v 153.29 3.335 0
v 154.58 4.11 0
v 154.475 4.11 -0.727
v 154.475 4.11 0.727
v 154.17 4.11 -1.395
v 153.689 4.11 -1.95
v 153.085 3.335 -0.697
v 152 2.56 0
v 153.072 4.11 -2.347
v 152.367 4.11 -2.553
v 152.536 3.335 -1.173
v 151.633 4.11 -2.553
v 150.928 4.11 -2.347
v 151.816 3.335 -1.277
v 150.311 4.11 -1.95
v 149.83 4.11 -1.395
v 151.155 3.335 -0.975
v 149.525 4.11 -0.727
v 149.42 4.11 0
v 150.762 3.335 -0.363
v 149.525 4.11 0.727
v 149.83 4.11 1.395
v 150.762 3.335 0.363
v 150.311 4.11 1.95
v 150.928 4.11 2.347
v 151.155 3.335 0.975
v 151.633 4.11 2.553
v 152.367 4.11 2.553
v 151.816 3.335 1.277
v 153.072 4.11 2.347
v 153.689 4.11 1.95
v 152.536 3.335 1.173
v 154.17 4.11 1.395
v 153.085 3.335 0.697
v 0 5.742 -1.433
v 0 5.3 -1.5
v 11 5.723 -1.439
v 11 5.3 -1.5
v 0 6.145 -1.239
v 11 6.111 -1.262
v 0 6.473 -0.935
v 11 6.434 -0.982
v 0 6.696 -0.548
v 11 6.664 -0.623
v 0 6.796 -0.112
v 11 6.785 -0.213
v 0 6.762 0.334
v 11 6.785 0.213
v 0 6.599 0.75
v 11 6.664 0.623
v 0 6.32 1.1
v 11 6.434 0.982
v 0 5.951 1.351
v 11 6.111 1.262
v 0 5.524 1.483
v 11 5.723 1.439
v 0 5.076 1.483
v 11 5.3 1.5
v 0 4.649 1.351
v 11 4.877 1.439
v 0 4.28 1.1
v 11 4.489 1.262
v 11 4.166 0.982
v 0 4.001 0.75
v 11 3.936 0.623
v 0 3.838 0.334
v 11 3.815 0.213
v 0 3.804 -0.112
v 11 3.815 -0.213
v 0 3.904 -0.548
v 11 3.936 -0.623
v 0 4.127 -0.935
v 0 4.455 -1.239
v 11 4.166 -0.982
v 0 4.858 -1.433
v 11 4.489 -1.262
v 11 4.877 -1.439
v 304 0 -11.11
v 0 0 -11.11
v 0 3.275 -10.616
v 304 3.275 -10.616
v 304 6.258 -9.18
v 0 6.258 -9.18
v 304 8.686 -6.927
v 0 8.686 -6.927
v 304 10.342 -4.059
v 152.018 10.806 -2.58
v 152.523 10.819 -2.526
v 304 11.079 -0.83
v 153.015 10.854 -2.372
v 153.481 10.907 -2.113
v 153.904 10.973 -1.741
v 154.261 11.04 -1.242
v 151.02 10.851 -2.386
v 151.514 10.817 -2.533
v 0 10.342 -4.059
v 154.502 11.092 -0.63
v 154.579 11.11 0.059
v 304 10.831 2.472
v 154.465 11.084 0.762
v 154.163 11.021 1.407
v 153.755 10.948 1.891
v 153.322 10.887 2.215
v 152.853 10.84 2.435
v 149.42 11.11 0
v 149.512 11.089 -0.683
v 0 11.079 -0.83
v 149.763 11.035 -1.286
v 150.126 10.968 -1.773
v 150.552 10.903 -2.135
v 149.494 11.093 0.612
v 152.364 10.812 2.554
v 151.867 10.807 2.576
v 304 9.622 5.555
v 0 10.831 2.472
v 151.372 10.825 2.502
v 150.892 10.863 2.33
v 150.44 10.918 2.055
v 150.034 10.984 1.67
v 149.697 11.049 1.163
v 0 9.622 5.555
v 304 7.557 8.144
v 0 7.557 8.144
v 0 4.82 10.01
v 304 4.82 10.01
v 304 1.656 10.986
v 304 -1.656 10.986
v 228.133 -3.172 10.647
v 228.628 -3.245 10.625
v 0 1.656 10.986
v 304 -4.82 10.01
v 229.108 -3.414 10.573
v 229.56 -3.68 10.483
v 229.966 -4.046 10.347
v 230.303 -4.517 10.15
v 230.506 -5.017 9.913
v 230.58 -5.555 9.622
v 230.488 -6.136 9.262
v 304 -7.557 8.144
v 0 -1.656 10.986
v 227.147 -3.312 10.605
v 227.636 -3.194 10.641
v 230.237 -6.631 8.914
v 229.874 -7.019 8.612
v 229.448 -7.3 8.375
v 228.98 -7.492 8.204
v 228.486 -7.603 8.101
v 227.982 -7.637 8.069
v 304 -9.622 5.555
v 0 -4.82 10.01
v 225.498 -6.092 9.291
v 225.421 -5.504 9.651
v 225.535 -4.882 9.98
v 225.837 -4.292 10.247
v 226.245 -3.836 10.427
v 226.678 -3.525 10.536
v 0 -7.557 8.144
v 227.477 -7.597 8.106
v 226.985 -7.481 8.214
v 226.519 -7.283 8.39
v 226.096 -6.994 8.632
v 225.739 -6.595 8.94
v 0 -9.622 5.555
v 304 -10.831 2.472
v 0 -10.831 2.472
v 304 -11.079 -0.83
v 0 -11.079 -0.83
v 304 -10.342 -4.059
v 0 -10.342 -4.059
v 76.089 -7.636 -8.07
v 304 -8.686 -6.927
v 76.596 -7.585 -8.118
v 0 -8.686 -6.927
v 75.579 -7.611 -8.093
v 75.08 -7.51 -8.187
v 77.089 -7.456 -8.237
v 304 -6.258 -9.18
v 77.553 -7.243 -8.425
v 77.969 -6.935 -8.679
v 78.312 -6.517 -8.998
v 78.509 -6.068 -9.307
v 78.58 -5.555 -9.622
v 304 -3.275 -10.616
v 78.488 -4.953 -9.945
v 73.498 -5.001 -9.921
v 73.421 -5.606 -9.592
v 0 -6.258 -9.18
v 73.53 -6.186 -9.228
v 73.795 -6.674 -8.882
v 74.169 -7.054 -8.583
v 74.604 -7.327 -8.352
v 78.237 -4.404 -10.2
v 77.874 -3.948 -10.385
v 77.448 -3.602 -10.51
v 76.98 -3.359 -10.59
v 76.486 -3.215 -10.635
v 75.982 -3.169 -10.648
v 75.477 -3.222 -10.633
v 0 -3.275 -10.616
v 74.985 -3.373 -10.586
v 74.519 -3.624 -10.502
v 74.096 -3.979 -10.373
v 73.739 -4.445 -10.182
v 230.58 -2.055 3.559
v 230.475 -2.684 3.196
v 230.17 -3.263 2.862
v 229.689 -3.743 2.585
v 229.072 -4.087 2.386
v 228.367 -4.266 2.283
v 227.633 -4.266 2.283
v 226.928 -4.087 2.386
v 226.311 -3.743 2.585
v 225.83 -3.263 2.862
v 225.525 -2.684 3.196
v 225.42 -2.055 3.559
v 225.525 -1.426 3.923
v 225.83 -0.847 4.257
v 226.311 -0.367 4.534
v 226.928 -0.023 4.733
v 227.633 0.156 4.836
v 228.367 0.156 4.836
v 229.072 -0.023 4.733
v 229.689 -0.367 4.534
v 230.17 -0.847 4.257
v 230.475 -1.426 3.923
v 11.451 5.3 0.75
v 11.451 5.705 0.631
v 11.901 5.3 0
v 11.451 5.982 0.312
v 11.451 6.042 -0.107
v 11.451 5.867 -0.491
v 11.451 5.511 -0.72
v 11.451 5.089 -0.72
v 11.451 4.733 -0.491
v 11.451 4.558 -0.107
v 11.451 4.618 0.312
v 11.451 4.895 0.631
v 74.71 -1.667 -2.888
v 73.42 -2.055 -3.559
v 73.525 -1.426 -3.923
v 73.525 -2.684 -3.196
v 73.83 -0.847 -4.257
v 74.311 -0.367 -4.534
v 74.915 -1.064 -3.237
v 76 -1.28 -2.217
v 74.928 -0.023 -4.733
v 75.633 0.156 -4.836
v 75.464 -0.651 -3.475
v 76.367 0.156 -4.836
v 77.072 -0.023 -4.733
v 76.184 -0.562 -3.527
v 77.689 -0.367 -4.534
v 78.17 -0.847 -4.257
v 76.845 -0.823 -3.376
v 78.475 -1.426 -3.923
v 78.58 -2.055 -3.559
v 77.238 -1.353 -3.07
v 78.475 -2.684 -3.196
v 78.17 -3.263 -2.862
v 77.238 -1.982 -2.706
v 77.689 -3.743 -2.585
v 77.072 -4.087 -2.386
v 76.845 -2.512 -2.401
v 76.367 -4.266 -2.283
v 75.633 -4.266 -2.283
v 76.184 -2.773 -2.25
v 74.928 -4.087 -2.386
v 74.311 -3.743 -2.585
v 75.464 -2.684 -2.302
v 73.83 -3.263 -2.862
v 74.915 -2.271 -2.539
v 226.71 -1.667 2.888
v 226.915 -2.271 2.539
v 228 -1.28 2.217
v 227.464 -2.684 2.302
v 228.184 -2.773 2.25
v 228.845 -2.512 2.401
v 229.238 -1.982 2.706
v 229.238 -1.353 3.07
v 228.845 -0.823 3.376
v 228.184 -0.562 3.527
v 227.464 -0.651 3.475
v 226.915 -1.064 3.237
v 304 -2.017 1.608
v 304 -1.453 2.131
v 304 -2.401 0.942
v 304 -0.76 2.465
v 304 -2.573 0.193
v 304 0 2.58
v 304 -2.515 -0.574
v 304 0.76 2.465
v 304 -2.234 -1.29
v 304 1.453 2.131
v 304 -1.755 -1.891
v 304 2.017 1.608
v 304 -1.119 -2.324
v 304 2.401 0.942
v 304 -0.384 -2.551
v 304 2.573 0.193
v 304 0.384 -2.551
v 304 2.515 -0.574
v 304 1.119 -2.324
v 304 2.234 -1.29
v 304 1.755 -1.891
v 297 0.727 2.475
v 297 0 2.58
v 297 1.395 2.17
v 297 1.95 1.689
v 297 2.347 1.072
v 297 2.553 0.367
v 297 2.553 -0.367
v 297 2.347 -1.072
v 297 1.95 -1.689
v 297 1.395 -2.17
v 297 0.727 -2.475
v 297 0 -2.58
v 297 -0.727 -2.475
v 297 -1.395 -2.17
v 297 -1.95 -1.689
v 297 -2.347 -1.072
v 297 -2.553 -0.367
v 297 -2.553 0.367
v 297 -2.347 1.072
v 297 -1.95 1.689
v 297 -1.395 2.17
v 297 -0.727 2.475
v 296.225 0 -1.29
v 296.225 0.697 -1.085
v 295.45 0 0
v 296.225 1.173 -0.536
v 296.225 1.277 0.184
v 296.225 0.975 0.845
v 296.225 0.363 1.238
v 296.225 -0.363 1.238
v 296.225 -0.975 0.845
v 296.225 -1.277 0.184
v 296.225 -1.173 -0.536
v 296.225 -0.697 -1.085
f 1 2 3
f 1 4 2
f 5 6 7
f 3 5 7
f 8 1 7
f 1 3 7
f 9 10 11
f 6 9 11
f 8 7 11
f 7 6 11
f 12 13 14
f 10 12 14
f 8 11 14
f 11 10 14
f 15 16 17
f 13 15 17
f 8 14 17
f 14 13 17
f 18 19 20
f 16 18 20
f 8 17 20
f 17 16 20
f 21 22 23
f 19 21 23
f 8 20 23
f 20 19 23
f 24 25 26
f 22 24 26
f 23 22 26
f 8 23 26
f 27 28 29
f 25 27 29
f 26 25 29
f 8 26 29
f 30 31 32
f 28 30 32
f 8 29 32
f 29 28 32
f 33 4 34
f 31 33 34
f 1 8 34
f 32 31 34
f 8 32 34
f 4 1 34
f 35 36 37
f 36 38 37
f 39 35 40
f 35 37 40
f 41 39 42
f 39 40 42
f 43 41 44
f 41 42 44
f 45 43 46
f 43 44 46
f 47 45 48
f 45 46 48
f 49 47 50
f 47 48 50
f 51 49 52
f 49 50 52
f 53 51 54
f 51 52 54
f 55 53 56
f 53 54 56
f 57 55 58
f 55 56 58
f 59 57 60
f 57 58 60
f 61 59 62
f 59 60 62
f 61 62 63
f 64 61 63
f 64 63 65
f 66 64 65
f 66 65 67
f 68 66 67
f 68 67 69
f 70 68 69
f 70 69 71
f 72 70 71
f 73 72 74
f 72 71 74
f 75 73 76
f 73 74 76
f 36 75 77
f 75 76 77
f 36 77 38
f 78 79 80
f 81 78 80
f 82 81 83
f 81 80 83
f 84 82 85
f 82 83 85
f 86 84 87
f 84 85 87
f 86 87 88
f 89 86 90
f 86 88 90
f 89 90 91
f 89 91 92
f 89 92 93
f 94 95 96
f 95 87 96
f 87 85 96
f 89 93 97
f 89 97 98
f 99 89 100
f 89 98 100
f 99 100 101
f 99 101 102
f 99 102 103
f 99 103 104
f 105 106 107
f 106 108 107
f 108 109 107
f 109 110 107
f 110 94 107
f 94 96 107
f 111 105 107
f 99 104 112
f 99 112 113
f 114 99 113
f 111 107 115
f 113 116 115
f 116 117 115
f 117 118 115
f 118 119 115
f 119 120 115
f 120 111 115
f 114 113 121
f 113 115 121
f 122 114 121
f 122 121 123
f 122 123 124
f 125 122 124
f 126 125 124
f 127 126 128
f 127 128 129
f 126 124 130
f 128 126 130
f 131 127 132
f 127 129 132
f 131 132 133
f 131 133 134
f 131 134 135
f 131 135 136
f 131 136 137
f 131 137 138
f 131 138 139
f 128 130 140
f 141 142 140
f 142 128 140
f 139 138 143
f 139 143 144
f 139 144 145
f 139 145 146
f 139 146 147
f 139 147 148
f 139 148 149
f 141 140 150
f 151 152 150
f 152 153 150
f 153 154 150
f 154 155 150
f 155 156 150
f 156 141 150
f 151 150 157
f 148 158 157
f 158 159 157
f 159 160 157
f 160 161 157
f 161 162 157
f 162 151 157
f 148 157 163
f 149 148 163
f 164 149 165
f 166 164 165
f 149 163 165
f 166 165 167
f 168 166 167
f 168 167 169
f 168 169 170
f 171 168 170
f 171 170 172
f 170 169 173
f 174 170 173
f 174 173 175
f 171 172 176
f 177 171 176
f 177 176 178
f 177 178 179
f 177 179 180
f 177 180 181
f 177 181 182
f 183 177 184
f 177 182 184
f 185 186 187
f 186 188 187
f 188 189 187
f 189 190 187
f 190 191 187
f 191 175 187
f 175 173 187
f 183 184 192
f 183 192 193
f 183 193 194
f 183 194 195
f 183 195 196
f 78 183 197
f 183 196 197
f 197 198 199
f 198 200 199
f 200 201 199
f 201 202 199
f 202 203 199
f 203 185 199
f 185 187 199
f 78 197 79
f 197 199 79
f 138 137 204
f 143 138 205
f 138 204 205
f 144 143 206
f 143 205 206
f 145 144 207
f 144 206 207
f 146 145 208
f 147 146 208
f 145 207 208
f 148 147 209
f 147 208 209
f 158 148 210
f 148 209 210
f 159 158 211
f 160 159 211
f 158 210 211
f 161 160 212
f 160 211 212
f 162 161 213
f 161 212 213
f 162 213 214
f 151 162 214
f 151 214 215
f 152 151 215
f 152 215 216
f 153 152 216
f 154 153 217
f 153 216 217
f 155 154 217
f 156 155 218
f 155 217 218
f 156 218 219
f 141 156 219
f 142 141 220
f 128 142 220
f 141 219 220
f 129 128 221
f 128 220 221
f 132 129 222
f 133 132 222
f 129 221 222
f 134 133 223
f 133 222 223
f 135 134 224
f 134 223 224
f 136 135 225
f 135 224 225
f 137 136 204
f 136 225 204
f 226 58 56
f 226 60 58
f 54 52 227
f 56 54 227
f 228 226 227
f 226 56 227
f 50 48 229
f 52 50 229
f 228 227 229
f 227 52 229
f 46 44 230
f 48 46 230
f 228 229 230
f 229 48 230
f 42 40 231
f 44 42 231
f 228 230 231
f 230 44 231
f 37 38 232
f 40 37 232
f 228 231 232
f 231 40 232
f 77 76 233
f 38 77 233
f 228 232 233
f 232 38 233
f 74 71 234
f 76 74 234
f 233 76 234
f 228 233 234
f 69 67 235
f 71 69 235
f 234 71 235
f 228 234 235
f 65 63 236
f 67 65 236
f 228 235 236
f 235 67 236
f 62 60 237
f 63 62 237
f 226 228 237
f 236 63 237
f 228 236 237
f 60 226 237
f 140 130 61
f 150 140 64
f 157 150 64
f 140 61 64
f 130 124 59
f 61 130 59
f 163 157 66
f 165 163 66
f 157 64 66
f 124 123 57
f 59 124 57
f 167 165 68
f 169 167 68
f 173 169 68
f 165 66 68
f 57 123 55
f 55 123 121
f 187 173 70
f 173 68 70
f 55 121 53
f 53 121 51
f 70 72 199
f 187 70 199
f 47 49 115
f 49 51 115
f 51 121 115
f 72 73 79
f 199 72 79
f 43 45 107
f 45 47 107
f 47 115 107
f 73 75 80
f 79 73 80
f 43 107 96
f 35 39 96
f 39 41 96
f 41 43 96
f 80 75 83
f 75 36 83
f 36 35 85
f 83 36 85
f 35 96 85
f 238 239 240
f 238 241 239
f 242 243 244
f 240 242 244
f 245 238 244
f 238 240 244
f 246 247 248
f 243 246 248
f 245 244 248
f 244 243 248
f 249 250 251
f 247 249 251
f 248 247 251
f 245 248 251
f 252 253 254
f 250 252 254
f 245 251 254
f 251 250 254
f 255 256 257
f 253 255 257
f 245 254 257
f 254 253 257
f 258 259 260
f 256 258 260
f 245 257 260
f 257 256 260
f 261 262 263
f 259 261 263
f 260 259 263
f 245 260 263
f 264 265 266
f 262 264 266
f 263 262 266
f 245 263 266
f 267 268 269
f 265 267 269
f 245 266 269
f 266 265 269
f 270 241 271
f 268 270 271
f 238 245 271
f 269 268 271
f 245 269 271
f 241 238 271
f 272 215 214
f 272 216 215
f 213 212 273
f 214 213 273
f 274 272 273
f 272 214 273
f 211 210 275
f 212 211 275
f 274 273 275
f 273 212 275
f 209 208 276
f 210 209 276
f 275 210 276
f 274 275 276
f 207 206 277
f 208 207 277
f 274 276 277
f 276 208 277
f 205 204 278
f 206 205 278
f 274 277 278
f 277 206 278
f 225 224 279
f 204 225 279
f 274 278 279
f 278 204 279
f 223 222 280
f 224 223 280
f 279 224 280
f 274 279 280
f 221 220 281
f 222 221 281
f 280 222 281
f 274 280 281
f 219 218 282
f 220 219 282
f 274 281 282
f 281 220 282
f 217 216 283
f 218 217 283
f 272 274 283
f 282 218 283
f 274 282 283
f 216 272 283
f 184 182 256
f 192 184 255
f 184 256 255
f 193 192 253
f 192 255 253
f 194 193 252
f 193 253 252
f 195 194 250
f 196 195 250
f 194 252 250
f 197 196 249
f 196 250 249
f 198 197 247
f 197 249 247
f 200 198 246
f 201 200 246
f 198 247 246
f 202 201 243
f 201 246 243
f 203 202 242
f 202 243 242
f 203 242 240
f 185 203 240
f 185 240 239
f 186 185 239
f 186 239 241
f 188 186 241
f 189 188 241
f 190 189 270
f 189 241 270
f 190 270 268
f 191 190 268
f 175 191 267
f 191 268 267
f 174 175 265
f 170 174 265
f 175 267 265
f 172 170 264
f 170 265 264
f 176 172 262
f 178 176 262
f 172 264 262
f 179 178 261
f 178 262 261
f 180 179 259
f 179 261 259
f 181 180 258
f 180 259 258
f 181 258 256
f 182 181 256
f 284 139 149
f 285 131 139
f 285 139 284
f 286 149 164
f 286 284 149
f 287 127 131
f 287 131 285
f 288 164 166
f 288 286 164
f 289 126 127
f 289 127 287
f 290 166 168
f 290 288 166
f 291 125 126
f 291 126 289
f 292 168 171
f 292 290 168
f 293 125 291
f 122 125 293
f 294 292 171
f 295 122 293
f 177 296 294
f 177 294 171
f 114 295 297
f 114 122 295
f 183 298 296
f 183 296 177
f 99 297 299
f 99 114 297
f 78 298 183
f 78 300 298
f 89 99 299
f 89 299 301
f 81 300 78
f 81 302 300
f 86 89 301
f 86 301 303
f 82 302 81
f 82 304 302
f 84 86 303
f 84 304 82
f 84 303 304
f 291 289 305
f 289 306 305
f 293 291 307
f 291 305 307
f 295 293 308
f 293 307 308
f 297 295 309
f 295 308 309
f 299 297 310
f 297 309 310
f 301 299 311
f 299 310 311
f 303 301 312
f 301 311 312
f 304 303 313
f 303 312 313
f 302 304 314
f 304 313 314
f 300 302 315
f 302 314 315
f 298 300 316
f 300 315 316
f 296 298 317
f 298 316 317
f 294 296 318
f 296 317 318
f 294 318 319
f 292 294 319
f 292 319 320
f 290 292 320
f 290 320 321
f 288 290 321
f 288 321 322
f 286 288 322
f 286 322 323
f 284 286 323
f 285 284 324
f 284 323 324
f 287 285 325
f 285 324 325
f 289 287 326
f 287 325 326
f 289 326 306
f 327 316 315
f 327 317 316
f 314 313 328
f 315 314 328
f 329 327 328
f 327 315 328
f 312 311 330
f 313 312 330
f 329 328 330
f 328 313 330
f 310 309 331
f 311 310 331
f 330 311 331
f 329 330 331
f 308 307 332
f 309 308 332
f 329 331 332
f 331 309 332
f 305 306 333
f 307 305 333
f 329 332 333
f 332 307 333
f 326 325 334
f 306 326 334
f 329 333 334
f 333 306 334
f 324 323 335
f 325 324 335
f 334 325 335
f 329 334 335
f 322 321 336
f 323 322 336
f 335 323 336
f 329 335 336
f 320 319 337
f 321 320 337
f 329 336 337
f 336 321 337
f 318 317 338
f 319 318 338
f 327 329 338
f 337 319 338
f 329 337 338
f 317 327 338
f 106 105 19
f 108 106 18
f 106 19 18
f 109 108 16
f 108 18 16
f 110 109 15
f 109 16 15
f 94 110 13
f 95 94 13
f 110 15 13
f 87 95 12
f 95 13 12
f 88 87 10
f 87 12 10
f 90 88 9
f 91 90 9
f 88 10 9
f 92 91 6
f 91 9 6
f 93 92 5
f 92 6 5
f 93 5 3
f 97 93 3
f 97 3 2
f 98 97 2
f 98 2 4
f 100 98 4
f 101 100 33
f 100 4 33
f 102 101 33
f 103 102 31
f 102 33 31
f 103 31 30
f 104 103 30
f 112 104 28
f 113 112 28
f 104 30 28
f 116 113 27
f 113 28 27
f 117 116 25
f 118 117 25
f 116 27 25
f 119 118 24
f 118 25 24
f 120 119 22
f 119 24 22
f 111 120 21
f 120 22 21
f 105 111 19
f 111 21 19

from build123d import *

# Parameters (mm, degrees)
SKETCH1_R                            = 11.11
BOSS_EXTRUDE1_DEPTH                  = 304
F_3_0_3_DIAMETER_HOLE2_D             = 3
F_3_0_3_DIAMETER_HOLE2_DEPTH         = 11
F_3_0_3_DIAMETER_HOLE2_TIP           = 0.901290929
F_13_64_0_20313_DIAMETER_HOLE2_D     = 5.159502
F_13_64_0_20313_DIAMETER_HOLE2_DEPTH = 7
F_13_64_0_20313_DIAMETER_HOLE2_TIP   = 1.550070783
F_13_64_0_20313_DIAMETER_HOLE4_D     = 5.159502
F_13_64_0_20313_DIAMETER_HOLE4_DEPTH = 7
F_13_64_0_20313_DIAMETER_HOLE4_TIP   = 1.550070783
F_13_64_0_20313_DIAMETER_HOLE5_D     = 5.159502
F_13_64_0_20313_DIAMETER_HOLE5_DEPTH = 7
F_13_64_0_20313_DIAMETER_HOLE5_TIP   = 1.550070783
F_13_64_0_20313_DIAMETER_HOLE6_D     = 5.159502
F_13_64_0_20313_DIAMETER_HOLE6_DEPTH = 7
F_13_64_0_20313_DIAMETER_HOLE6_TIP   = 1.550070783


with BuildPart() as part:
    # Sketch1 → Boss-Extrude1 (new body)
    with BuildSketch(Plane(origin=(0, 0, 0), x_dir=(0, 0, -1), z_dir=(1, 0, 0))):
        Circle(SKETCH1_R)
    extrude(amount=BOSS_EXTRUDE1_DEPTH)

    # Ø3.0 (3) Diameter Hole2
    with Locations(Plane.ZY):
        with Locations((0, 5.3)):
            Hole(F_3_0_3_DIAMETER_HOLE2_D / 2, depth=F_3_0_3_DIAMETER_HOLE2_DEPTH)
            with Locations((0, 0, -(F_3_0_3_DIAMETER_HOLE2_DEPTH + F_3_0_3_DIAMETER_HOLE2_TIP / 2))):  # 118° drill point
                Cone(0, F_3_0_3_DIAMETER_HOLE2_D / 2, F_3_0_3_DIAMETER_HOLE2_TIP, mode=Mode.SUBTRACT)

    # 13/64 (0.20313) Diameter Hole2
    with Locations(Plane(origin=(0, 11.11, 0), x_dir=(1, 0, 0), z_dir=(0, 1, 0))):
        with Locations((152, 0)):
            Hole(F_13_64_0_20313_DIAMETER_HOLE2_D / 2, depth=F_13_64_0_20313_DIAMETER_HOLE2_DEPTH)
            with Locations((0, 0, -(F_13_64_0_20313_DIAMETER_HOLE2_DEPTH + F_13_64_0_20313_DIAMETER_HOLE2_TIP / 2))):  # 118° drill point
                Cone(0, F_13_64_0_20313_DIAMETER_HOLE2_D / 2, F_13_64_0_20313_DIAMETER_HOLE2_TIP, mode=Mode.SUBTRACT)

    # 13/64 (0.20313) Diameter Hole4
    with Locations(Plane(origin=(0, -5.555, -9.621542236), x_dir=(-1, 0, 0), z_dir=(0, -0.50000000000001, -0.8660254037844328))):
        with Locations((-76, 0)):
            Hole(F_13_64_0_20313_DIAMETER_HOLE4_D / 2, depth=F_13_64_0_20313_DIAMETER_HOLE4_DEPTH)
            with Locations((0, 0, -(F_13_64_0_20313_DIAMETER_HOLE4_DEPTH + F_13_64_0_20313_DIAMETER_HOLE4_TIP / 2))):  # 118° drill point
                Cone(0, F_13_64_0_20313_DIAMETER_HOLE4_D / 2, F_13_64_0_20313_DIAMETER_HOLE4_TIP, mode=Mode.SUBTRACT)

    # 13/64 (0.20313) Diameter Hole5
    with Locations(Plane(origin=(0, -5.555, 9.621542236), x_dir=(-1, 0, 0), z_dir=(0, -0.499999999999998, 0.8660254037844398))):
        with Locations((-228, 0)):
            Hole(F_13_64_0_20313_DIAMETER_HOLE5_D / 2, depth=F_13_64_0_20313_DIAMETER_HOLE5_DEPTH)
            with Locations((0, 0, -(F_13_64_0_20313_DIAMETER_HOLE5_DEPTH + F_13_64_0_20313_DIAMETER_HOLE5_TIP / 2))):  # 118° drill point
                Cone(0, F_13_64_0_20313_DIAMETER_HOLE5_D / 2, F_13_64_0_20313_DIAMETER_HOLE5_TIP, mode=Mode.SUBTRACT)

    # 13/64 (0.20313) Diameter Hole6
    with Locations(Plane(origin=(304, 0, 0), x_dir=(0, 0, -1), z_dir=(1, 0, 0))):
        with Locations((0, 0)):
            Hole(F_13_64_0_20313_DIAMETER_HOLE6_D / 2, depth=F_13_64_0_20313_DIAMETER_HOLE6_DEPTH)
            with Locations((0, 0, -(F_13_64_0_20313_DIAMETER_HOLE6_DEPTH + F_13_64_0_20313_DIAMETER_HOLE6_TIP / 2))):  # 118° drill point
                Cone(0, F_13_64_0_20313_DIAMETER_HOLE6_D / 2, F_13_64_0_20313_DIAMETER_HOLE6_TIP, mode=Mode.SUBTRACT)


solid = part.part
